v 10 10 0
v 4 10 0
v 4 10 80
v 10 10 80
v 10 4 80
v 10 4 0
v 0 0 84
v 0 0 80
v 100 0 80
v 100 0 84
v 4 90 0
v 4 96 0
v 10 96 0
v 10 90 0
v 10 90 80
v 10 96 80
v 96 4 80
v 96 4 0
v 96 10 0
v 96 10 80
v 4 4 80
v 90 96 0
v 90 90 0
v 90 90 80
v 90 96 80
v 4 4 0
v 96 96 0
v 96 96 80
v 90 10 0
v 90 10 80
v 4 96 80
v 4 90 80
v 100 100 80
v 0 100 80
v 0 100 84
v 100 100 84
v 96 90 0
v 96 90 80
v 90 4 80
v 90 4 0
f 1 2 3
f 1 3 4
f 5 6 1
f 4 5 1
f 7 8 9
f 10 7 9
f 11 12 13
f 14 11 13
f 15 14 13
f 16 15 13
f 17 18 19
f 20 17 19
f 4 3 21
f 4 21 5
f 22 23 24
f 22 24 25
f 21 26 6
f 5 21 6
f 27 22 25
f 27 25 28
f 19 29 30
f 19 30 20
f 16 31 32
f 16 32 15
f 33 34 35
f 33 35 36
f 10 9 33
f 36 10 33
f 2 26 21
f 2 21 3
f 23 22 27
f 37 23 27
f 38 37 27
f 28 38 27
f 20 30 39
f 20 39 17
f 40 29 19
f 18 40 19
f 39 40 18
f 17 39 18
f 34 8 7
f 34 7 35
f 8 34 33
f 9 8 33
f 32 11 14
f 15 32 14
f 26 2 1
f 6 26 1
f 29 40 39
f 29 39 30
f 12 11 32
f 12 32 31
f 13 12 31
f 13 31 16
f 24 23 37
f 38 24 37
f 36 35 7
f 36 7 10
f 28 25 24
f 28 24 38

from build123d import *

# Parameters (mm, degrees)
BOX_W        = 100
BOX_H        = 100
BOX_DEPTH    = 4
BOX001_W     = 6
BOX001_H     = 6
BOX001_DEPTH = 80
BOX002_W     = 6
BOX002_H     = 6
BOX002_DEPTH = 80
BOX003_W     = 6
BOX003_H     = 6
BOX003_DEPTH = 80
BOX004_W     = 6
BOX004_H     = 6
BOX004_DEPTH = 80


with BuildPart() as cube:
    # Box → Box (new body)
    with BuildSketch(Plane.XY.offset(80)):
        with Locations((50, 50)):
            Rectangle(BOX_W, BOX_H)
    extrude(amount=BOX_DEPTH)


with BuildPart() as cube001:
    # Box001 → Box001 (new body)
    with BuildSketch(Plane(origin=(4, 4, 0), x_dir=(1, 0, 0), z_dir=(0, 0, 1))):
        with Locations((3, 3)):
            Rectangle(BOX001_W, BOX001_H)
    extrude(amount=BOX001_DEPTH)


with BuildPart() as cube002:
    # Box002 → Box002 (new body)
    with BuildSketch(Plane(origin=(90, 90, 0), x_dir=(1, 0, 0), z_dir=(0, 0, 1))):
        with Locations((3, 3)):
            Rectangle(BOX002_W, BOX002_H)
    extrude(amount=BOX002_DEPTH)


with BuildPart() as cube003:
    # Box003 → Box003 (new body)
    with BuildSketch(Plane(origin=(4, 90, 0), x_dir=(1, 0, 0), z_dir=(0, 0, 1))):
        with Locations((3, 3)):
            Rectangle(BOX003_W, BOX003_H)
    extrude(amount=BOX003_DEPTH)


with BuildPart() as cube004:
    # Box004 → Box004 (new body)
    with BuildSketch(Plane(origin=(90, 4, 0), x_dir=(1, 0, 0), z_dir=(0, 0, 1))):
        with Locations((3, 3)):
            Rectangle(BOX004_W, BOX004_H)
    extrude(amount=BOX004_DEPTH)


solid = Compound([cube.part, cube001.part, cube002.part, cube003.part, cube004.part])
